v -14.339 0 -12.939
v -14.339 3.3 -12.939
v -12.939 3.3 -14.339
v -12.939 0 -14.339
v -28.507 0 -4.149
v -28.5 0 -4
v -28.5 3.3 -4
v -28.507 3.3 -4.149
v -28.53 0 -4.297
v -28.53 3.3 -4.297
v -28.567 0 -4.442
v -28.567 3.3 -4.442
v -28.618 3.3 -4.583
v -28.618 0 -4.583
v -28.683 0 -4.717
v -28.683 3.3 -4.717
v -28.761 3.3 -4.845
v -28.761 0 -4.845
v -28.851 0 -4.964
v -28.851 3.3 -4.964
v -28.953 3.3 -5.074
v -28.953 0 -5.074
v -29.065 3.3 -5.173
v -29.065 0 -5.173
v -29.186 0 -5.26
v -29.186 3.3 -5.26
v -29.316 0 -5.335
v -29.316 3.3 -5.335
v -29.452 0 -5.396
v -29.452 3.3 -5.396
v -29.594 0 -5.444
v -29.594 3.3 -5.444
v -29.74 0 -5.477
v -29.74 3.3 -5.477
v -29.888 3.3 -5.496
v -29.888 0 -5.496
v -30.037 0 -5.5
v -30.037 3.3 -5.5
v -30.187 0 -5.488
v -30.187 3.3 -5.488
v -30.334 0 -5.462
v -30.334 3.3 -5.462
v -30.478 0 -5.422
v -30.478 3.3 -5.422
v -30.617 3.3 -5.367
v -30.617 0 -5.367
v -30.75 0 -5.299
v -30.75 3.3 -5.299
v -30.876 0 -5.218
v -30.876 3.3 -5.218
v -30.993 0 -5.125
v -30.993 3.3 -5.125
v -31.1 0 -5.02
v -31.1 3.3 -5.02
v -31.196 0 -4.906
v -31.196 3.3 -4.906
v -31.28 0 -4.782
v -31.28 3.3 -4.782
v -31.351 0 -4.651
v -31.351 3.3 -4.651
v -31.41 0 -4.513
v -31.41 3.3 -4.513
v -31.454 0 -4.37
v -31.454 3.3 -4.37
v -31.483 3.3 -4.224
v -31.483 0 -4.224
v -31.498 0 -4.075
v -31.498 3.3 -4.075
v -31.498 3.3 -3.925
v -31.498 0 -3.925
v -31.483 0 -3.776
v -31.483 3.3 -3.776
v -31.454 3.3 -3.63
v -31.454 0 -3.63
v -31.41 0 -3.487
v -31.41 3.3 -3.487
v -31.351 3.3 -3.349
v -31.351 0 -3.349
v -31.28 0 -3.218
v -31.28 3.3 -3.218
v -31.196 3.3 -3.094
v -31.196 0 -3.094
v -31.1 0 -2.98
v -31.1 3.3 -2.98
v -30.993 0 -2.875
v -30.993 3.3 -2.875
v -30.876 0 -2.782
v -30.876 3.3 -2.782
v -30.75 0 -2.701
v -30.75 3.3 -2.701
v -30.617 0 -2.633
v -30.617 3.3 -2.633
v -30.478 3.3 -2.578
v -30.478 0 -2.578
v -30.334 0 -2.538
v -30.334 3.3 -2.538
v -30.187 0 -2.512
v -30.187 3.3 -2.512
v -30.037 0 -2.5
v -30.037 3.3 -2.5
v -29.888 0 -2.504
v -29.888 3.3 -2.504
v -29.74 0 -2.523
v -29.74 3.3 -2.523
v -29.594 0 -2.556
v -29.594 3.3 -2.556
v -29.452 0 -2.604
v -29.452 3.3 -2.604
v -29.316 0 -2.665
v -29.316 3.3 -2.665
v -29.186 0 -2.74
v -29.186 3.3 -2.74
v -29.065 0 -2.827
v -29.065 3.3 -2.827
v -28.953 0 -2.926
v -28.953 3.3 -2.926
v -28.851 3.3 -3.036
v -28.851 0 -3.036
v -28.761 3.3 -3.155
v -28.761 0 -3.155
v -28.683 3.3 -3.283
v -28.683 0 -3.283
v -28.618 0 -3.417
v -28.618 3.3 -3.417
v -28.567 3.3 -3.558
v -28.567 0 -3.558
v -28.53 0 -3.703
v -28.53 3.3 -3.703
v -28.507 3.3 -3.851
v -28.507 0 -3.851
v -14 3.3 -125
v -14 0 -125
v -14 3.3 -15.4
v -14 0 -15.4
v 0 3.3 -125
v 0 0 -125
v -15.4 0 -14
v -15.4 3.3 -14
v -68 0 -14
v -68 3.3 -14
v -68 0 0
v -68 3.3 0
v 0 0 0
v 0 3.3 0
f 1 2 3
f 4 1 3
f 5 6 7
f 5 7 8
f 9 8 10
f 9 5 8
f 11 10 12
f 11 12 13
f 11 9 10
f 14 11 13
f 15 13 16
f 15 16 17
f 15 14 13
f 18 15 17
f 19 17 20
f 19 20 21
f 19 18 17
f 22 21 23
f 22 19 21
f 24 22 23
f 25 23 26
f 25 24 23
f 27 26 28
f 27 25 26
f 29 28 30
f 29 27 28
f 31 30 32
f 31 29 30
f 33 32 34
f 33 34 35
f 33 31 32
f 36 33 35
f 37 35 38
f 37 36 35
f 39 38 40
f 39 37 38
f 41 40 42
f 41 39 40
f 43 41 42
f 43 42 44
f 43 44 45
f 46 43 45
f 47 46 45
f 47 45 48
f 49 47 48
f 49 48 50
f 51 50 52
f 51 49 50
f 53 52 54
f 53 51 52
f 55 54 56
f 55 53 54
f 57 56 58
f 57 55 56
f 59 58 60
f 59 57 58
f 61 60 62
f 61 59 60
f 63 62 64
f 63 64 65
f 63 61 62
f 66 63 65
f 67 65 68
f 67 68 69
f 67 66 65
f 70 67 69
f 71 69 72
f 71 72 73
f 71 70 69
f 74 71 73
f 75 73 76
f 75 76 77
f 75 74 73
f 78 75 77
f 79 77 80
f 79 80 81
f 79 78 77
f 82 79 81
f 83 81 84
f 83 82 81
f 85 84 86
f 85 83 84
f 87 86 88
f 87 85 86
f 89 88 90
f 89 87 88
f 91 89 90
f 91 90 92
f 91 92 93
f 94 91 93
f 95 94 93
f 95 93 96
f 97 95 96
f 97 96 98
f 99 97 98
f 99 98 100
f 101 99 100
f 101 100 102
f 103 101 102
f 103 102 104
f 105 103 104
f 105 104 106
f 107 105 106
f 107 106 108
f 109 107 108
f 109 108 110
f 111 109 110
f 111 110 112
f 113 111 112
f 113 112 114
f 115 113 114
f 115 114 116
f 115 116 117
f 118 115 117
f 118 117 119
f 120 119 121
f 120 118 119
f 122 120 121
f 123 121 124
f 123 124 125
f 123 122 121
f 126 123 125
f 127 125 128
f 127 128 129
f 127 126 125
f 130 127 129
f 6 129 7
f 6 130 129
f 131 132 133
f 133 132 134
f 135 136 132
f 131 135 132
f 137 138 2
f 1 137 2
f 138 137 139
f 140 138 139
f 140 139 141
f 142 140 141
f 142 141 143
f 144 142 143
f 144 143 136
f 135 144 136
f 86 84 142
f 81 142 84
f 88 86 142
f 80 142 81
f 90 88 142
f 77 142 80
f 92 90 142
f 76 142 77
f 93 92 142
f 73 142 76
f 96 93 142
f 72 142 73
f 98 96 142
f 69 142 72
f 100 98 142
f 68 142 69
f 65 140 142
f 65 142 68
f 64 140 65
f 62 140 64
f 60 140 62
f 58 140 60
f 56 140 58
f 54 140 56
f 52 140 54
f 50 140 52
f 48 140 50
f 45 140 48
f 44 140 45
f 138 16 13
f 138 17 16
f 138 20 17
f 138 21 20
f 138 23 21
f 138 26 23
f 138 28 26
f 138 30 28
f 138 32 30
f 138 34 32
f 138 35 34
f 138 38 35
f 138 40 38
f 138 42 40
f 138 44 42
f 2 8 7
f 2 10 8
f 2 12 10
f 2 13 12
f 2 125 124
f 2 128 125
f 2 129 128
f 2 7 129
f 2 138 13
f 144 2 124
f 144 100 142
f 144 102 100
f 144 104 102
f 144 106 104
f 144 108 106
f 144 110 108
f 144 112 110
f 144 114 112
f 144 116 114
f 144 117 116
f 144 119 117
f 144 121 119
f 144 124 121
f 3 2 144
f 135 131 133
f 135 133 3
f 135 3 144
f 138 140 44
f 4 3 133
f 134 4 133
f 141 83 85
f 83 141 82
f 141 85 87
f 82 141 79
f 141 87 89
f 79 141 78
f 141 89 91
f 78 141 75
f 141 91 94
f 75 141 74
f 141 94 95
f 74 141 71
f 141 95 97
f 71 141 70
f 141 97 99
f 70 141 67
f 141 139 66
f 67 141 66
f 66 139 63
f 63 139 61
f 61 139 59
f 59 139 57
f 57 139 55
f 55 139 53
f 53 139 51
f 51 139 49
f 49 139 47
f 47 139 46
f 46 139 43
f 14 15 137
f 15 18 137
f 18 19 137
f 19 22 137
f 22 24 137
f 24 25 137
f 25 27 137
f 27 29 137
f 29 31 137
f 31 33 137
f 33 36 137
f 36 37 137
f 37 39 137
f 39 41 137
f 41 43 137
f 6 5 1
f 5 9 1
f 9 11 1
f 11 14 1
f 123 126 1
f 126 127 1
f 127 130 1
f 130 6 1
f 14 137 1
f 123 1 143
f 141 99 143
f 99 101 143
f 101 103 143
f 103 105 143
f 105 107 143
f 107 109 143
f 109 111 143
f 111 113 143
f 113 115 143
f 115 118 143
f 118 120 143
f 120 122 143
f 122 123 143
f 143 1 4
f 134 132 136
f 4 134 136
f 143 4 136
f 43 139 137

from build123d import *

# Parameters (mm, degrees)
SKETCH_1_R          = 1.5
EXTRUDE_1_DEPTH     = 3.3
CUT_EXTRUDE_1_DEPTH = 3.3


with BuildPart() as part:
    # Эскиз1 → Бобышка-Вытянуть1 (new body)
    with BuildSketch(Plane(origin=(0, 0, 0), x_dir=(1, 0, 0), z_dir=(0, 1, 0))):
        Polygon((0, 0), (0, 125), (-14, 125), (-14, 14), (-68, 14), (-68, 0), align=None)
        with Locations((-30, 4)):
            Circle(SKETCH_1_R, mode=Mode.SUBTRACT)
    extrude(amount=EXTRUDE_1_DEPTH)

    # Эскиз2 → Вырез-Вытянуть1 (cut)
    with BuildSketch(Plane(origin=(0, 3.3, 0), x_dir=(1, 0, 0), z_dir=(0, 1, 0))):
        Polygon((-15.4, 14), (-14.339339828, 12.939339828), (-12.939339828, 14.339339828), (-14, 15.4), align=None)
    extrude(amount=-CUT_EXTRUDE_1_DEPTH, mode=Mode.SUBTRACT)


solid = part.part
